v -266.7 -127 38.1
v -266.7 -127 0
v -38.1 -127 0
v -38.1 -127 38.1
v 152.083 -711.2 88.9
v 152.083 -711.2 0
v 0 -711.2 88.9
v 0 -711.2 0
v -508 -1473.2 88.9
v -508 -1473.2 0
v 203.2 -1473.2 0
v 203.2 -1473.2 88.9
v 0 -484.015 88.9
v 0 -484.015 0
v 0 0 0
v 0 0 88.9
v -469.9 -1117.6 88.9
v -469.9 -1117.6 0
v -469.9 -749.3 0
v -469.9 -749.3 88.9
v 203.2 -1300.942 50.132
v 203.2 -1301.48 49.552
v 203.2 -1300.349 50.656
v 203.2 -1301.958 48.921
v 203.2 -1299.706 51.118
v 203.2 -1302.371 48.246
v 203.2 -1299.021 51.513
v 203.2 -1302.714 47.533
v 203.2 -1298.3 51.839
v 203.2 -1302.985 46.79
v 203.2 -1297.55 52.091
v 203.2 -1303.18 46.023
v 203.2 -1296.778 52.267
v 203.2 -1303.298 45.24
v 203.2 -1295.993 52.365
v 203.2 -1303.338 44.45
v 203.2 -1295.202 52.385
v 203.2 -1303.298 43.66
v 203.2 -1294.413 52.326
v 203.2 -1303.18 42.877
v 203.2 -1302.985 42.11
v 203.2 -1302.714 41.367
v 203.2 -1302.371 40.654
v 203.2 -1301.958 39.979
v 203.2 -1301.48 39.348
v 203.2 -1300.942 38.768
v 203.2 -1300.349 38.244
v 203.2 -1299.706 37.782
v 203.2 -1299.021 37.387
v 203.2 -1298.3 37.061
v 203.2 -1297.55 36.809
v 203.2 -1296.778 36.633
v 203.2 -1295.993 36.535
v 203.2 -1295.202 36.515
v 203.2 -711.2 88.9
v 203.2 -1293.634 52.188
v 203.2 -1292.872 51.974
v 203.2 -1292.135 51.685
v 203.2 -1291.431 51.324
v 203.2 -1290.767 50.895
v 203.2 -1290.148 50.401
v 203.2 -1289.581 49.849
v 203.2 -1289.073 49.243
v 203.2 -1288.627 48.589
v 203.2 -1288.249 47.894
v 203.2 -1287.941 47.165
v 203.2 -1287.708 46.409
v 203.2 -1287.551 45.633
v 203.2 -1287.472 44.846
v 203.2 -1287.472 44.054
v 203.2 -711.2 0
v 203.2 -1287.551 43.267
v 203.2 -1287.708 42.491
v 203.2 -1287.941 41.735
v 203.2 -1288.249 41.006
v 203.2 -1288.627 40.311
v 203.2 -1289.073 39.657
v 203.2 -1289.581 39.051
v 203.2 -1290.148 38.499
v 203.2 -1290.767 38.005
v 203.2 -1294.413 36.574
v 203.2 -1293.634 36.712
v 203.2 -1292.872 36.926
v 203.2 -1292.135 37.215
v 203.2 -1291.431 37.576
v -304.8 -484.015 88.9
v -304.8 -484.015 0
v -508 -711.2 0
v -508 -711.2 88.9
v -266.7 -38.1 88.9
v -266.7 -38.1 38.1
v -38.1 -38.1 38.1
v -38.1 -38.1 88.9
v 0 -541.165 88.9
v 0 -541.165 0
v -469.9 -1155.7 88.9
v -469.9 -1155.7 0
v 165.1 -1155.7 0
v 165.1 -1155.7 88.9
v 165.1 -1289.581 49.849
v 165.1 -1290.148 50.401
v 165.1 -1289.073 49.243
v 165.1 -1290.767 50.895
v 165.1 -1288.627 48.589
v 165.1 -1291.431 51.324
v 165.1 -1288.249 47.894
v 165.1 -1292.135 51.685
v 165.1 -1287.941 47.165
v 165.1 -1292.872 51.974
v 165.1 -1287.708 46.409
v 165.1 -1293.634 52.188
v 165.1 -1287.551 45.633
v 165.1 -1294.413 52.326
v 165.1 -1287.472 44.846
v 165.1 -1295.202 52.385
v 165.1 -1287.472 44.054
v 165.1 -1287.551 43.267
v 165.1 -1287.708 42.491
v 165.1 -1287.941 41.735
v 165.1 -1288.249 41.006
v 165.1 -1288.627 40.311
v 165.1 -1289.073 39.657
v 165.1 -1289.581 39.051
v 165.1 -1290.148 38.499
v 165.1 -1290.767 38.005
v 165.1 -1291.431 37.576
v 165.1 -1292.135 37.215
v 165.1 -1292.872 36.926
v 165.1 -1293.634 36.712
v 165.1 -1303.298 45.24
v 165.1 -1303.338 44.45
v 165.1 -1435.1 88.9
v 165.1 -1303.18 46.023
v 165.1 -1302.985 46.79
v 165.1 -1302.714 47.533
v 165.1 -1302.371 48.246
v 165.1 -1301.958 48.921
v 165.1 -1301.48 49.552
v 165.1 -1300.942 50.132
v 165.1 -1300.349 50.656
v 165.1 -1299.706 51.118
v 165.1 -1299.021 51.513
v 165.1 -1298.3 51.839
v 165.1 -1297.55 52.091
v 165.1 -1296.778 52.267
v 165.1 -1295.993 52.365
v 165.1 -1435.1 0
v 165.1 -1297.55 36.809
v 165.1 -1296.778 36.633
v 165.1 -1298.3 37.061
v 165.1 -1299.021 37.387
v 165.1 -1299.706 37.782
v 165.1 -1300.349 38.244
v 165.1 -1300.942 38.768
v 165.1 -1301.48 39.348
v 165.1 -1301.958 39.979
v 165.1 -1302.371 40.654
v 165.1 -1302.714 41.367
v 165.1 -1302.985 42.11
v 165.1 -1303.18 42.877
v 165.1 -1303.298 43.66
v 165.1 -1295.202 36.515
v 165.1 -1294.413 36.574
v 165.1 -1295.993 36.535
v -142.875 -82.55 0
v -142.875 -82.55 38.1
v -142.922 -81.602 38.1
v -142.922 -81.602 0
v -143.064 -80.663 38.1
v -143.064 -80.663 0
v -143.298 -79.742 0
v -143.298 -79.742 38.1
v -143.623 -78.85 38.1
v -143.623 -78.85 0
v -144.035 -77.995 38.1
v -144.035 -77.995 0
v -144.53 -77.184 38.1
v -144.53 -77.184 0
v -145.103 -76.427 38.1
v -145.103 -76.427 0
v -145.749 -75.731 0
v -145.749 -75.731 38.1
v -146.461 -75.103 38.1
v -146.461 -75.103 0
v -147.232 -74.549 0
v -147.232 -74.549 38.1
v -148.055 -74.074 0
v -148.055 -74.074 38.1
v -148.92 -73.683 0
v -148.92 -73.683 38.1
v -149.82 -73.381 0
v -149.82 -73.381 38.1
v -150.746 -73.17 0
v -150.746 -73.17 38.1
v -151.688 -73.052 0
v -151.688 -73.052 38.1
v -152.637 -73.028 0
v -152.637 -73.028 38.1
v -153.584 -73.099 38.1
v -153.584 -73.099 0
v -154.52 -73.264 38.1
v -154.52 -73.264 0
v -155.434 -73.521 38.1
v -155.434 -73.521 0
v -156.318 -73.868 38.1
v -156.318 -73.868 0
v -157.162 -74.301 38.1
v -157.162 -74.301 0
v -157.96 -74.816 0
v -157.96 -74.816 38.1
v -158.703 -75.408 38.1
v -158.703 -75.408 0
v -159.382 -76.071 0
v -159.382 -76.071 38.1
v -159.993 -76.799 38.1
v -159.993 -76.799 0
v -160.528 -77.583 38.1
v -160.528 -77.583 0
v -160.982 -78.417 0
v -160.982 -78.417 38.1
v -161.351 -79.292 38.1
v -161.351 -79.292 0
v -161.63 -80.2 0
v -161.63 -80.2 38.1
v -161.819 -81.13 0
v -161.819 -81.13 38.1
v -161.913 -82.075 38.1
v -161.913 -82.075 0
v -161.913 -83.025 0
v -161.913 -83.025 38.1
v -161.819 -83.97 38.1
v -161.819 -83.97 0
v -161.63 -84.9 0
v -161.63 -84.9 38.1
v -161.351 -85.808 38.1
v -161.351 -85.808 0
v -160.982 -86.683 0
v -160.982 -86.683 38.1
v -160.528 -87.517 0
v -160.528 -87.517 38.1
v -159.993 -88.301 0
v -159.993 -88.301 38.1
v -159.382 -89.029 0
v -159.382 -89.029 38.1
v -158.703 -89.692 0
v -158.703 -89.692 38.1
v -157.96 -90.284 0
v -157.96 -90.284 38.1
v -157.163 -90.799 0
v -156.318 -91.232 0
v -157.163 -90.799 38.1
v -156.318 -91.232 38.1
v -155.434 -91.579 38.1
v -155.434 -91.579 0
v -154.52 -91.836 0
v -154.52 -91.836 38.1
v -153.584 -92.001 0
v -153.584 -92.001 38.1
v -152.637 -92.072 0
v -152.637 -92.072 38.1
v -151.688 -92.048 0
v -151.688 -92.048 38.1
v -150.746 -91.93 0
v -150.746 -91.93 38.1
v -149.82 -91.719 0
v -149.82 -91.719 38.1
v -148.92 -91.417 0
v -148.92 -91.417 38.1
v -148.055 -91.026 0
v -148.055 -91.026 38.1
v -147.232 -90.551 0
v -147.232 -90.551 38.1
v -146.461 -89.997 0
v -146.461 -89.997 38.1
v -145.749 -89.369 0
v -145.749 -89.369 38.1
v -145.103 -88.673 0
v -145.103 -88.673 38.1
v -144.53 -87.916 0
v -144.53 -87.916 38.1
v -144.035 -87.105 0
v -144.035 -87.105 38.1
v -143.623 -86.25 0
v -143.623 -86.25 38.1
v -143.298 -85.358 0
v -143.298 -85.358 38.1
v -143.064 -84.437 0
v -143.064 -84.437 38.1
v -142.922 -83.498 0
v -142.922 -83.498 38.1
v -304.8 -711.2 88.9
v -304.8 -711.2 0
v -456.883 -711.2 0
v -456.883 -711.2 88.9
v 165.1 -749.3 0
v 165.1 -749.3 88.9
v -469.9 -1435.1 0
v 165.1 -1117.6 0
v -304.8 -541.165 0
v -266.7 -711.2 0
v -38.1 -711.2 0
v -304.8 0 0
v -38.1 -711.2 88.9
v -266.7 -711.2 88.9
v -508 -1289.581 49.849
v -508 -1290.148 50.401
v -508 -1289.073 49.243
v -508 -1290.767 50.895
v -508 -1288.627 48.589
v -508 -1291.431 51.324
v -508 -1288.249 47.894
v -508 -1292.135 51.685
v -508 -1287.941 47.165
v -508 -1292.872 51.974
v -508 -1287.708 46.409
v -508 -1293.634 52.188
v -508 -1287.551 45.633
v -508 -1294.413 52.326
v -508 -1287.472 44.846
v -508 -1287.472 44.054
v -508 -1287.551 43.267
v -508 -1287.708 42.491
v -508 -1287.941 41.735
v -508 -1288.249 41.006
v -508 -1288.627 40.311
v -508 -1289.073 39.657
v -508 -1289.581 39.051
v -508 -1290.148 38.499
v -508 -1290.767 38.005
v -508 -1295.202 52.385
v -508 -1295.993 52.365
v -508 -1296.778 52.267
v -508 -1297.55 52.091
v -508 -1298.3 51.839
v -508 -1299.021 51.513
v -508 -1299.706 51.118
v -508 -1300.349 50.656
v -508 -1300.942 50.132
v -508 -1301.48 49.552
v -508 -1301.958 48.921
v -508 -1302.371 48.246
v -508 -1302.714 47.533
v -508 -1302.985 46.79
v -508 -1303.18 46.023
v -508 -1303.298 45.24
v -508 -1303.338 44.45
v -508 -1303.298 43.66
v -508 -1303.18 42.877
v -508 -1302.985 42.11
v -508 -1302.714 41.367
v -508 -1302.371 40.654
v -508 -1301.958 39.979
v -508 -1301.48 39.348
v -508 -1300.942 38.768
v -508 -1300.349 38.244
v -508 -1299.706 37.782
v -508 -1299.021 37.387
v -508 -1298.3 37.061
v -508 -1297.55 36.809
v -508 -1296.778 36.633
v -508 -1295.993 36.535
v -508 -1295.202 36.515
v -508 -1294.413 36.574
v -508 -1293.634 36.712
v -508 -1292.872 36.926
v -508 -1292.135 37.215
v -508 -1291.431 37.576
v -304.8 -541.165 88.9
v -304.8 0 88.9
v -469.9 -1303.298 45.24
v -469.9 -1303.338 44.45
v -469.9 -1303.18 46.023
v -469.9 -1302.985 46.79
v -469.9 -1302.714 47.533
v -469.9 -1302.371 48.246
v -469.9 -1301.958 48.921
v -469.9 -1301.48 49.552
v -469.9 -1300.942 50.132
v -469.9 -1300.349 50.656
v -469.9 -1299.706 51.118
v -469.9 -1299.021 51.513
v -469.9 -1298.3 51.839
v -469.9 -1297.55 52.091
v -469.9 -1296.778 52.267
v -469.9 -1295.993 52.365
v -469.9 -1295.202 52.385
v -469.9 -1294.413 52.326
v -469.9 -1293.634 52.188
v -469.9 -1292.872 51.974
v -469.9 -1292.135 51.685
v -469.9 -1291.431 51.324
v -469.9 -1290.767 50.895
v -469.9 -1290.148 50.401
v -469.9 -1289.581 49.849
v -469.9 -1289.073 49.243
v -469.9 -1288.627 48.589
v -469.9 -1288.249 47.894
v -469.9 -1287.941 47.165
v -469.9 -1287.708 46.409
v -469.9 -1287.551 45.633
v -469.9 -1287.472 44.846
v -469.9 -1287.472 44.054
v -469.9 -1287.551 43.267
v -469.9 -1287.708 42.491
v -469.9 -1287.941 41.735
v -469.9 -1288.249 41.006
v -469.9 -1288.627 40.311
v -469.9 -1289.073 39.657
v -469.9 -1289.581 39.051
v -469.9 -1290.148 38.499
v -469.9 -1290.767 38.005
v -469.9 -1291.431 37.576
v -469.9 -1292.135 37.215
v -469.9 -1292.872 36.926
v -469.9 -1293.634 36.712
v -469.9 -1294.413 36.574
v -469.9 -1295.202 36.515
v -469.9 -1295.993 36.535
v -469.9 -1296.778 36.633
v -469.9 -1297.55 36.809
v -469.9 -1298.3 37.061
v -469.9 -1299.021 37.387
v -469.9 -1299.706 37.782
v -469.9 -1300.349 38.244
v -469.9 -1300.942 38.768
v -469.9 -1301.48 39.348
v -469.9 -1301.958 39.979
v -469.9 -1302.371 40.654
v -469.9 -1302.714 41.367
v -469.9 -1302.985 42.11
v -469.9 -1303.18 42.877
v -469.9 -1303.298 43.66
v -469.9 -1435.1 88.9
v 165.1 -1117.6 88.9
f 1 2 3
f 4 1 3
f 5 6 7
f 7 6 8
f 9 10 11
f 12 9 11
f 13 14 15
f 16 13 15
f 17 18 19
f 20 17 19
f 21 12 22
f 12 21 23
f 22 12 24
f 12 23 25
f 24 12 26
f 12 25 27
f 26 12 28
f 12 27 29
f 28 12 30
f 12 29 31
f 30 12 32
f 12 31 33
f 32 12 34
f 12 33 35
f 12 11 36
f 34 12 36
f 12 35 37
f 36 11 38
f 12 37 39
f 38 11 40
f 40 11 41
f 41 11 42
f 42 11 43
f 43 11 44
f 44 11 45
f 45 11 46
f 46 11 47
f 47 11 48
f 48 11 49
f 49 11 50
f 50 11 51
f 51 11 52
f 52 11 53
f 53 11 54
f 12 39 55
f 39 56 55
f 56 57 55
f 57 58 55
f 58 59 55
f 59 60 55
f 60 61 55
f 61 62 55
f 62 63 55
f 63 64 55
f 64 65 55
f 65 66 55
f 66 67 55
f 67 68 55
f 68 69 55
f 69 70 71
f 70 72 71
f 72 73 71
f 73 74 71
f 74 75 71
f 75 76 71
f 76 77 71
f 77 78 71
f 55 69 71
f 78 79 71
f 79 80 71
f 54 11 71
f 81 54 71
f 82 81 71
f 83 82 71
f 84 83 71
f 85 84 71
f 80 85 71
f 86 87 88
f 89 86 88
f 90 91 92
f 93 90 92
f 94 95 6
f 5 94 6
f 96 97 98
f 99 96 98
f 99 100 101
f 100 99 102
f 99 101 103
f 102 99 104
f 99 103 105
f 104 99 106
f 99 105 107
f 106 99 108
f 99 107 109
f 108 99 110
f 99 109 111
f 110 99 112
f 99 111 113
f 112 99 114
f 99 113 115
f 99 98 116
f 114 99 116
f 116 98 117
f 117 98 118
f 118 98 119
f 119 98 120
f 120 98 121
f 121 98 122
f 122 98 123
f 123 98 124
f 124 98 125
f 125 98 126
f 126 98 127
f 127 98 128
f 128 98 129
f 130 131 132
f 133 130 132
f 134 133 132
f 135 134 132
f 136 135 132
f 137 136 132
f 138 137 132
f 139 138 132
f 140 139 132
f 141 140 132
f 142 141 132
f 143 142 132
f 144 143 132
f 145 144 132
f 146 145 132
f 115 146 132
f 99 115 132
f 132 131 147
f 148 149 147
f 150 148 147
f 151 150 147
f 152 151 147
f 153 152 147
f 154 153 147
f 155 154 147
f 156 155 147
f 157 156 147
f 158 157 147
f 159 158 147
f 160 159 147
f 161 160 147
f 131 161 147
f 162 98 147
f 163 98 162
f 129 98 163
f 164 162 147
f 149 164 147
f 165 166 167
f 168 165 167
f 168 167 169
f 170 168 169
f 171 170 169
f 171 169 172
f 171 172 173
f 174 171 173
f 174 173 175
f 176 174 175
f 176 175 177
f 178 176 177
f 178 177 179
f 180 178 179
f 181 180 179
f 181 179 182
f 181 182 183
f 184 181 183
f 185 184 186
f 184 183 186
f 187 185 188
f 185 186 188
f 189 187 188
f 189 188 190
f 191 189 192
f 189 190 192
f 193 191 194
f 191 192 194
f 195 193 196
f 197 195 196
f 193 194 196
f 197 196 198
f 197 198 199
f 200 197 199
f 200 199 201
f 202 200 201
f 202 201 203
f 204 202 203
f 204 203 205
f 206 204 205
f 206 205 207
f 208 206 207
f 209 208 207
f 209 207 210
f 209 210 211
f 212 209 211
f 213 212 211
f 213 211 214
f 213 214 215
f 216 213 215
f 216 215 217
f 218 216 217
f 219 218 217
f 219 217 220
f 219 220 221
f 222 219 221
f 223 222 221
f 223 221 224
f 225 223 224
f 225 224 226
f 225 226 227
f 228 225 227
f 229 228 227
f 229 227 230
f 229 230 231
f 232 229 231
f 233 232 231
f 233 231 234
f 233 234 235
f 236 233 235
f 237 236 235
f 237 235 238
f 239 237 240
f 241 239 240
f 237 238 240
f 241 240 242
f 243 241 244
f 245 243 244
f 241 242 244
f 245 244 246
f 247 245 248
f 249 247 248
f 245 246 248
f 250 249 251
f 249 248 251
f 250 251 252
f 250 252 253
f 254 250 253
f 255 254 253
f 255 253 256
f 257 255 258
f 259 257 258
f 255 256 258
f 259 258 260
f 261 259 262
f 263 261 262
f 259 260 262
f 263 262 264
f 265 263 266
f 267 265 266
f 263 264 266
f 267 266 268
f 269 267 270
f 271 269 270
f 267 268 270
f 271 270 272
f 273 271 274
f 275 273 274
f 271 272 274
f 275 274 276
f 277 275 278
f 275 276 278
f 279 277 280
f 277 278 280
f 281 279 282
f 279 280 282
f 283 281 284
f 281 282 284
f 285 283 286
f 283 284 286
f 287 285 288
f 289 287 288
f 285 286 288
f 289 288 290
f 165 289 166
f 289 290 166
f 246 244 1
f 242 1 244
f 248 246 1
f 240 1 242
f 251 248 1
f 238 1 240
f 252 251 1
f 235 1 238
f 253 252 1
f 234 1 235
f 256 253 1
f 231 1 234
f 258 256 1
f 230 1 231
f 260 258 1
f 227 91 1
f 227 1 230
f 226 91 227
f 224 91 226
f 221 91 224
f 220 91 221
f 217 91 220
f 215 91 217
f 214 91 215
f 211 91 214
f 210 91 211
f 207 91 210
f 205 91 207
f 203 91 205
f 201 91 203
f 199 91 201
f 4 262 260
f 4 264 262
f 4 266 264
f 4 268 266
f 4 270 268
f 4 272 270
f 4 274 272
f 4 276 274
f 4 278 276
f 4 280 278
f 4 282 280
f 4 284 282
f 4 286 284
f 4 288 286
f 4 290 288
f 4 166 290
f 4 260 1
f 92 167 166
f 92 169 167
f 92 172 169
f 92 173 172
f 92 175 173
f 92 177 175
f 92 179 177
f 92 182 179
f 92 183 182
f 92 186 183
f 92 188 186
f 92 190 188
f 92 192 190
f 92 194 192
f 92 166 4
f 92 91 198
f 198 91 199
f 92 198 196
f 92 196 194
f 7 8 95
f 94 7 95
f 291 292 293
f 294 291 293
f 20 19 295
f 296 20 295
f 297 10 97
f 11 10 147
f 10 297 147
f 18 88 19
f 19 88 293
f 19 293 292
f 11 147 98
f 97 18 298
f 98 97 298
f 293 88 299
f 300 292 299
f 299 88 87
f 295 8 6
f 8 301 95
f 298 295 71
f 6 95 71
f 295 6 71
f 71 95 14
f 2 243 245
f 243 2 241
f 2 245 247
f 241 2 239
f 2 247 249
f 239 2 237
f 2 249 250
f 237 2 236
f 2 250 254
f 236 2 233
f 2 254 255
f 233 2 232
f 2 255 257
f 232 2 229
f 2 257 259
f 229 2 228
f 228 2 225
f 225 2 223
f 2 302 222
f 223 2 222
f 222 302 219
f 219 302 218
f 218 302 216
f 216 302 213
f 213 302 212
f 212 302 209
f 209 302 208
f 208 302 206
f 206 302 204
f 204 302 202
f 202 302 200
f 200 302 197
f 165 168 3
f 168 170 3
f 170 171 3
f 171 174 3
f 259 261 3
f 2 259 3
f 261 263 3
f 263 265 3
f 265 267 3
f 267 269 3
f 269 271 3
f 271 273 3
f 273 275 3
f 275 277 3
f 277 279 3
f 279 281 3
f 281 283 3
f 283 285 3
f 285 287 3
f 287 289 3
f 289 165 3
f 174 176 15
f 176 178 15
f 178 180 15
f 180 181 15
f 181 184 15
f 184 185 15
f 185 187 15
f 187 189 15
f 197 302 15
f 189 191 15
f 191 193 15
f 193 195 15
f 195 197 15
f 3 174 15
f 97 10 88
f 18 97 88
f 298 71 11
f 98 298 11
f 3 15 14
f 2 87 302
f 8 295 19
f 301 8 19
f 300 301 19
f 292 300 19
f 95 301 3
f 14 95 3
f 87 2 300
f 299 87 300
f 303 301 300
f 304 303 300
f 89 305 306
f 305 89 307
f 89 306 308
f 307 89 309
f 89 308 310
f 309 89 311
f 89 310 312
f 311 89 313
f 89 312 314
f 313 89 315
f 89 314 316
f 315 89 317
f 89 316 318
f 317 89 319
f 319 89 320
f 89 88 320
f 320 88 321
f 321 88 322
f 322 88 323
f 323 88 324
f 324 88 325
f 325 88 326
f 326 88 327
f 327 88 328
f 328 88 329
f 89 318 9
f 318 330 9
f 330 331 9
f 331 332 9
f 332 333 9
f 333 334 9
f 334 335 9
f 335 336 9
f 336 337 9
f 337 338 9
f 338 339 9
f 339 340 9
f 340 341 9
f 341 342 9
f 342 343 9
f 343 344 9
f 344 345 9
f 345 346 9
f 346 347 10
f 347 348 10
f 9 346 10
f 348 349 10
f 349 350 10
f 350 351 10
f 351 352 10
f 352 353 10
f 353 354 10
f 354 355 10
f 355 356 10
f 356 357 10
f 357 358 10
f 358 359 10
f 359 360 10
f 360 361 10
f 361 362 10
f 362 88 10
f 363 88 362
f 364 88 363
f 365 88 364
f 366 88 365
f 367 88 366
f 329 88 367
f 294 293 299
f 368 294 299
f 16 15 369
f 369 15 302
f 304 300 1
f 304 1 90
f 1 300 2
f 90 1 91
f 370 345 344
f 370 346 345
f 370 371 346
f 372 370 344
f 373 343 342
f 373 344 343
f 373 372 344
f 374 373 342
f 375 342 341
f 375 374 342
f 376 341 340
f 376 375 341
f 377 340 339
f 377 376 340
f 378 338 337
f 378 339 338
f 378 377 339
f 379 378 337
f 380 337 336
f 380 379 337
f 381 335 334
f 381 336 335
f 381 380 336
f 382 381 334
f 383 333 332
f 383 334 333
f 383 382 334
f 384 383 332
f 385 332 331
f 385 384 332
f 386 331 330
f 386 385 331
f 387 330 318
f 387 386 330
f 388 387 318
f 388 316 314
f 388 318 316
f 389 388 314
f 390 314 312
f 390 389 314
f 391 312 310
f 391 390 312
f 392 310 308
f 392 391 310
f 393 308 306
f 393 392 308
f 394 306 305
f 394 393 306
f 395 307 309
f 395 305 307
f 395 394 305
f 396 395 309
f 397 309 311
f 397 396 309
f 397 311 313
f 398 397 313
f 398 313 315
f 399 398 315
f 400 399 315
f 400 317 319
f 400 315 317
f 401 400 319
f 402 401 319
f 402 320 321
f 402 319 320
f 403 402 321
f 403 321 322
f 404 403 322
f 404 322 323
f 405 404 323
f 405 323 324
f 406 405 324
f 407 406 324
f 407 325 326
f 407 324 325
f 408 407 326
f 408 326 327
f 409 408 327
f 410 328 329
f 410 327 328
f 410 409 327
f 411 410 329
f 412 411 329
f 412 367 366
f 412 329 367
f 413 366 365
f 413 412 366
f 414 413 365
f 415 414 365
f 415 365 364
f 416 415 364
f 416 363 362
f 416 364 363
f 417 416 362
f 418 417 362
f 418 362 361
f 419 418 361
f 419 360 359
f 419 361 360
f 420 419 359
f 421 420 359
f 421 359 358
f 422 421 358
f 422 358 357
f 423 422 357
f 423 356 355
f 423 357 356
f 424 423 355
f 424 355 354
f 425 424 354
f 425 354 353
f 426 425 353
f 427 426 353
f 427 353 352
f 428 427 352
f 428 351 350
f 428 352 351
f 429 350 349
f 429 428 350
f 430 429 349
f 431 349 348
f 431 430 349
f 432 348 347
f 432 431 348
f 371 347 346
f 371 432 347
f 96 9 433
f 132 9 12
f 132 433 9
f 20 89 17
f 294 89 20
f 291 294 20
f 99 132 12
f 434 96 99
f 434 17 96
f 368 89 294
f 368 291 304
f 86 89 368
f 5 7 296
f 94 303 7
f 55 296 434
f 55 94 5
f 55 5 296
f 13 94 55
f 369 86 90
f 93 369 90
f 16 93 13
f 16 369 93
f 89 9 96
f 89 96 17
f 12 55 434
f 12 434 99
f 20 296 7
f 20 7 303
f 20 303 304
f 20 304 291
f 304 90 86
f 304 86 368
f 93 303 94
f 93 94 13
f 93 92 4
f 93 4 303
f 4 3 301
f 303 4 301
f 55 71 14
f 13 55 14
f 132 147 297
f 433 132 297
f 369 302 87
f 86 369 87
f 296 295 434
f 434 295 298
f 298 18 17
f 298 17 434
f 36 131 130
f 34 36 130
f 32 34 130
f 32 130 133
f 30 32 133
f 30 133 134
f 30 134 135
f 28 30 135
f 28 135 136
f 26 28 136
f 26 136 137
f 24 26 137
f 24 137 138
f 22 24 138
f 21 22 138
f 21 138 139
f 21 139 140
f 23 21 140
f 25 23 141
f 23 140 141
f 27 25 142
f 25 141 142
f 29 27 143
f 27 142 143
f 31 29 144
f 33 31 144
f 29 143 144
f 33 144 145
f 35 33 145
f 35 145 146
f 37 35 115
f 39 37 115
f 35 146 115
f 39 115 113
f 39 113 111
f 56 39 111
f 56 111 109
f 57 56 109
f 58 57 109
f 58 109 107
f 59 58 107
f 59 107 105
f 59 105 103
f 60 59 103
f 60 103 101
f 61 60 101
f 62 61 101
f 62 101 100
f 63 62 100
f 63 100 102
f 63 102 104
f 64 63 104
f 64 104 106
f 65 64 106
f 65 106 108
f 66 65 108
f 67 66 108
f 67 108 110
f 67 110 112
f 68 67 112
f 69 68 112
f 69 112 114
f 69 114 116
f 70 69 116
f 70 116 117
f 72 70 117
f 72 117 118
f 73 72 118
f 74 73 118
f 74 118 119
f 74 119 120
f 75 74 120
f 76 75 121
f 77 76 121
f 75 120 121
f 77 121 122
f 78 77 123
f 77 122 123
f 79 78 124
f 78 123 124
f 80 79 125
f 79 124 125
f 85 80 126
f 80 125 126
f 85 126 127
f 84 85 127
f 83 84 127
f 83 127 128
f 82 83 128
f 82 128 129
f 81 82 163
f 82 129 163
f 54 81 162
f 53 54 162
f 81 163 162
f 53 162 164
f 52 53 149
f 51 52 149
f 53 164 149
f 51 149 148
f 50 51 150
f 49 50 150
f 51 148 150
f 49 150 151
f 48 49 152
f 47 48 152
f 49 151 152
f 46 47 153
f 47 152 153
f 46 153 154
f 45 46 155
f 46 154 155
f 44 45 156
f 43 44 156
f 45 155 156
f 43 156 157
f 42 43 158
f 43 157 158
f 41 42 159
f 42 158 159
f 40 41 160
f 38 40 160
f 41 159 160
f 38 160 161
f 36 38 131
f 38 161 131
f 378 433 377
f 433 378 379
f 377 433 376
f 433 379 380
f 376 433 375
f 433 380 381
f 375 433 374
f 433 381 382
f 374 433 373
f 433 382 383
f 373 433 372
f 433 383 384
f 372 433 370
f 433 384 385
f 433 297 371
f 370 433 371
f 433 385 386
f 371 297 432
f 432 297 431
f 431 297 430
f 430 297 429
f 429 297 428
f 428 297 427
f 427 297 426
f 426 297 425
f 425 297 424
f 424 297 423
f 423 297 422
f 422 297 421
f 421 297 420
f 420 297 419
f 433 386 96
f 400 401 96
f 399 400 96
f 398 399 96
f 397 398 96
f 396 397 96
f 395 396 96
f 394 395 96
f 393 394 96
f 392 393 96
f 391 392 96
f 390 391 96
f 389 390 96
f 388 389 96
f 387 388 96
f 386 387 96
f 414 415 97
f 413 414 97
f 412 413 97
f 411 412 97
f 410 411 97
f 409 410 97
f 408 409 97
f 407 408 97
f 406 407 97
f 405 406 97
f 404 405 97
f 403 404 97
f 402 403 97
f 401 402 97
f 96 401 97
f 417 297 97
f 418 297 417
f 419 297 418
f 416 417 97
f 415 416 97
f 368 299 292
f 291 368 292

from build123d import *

# Parameters (mm, degrees)
F0_W          = 635
F0_H          = 38.1
F0_W_2        = 38.1
F1_DEPTH      = 88.9
F0_W_3        = 228.6
F0_H_2        = 88.9
F2_DEPTH      = 38.1
F3_R          = 9.525
F4_DEPTH      = 38.101
F5_R          = 7.9375
F6_DEPTH      = 673.101
F6_DEPTH_BACK = 38.101


with BuildPart() as f1:
    # F0 (on Top) → F1 (new body)
    with BuildSketch(Plane.XY):
        Polygon((0, -484.015493486), (0, 0), (-304.8, 0), (-304.8, -484.015493486), (-304.8, -541.165493486), (-304.8, -711.2), (-266.7, -711.2), (-266.7, -127), (-266.7, -38.1), (-38.1, -38.1), (-38.1, -127), (-38.1, -711.2), (0, -711.2), (0, -541.165493486), align=None)
        Polygon((-304.8, -541.165493486), (-304.8, -484.015493486), (-508, -711.2), (-456.8834860344, -711.2), align=None)
        Polygon((203.2, -711.2), (0, -484.015493486), (0, -541.165493486), (152.0834860344, -711.2), align=None)
        Polygon((203.2, -1117.6), (203.2, -711.2), (152.0834860344, -711.2), (0, -711.2), (-38.1, -711.2), (-152.4, -711.2), (-266.7, -711.2), (-304.8, -711.2), (-456.8834860344, -711.2), (-508, -711.2), (-508, -1117.6), (-469.9, -1117.6), (-469.9, -749.3), (165.1, -749.3), (165.1, -1117.6), align=None)
        with Locations((-152.4, -1136.65)):
            Rectangle(F0_W, F0_H)
        with Locations((184.15, -1136.65)):
            Rectangle(F0_W_2, F0_H)
        Polygon((203.2, -1473.2), (203.2, -1155.7), (165.1, -1155.7), (165.1, -1435.1), (-469.9, -1435.1), (-469.9, -1155.7), (-508, -1155.7), (-508, -1473.2), align=None)
        with Locations((-488.95, -1136.65)):
            Rectangle(F0_W_2, F0_H)
    extrude(amount=F1_DEPTH)

    # F0 (on Top) → F2 (join)
    with BuildSketch(Plane.XY):
        with Locations((-152.4, -82.55)):
            Rectangle(F0_W_3, F0_H_2)
    extrude(amount=F2_DEPTH)

    # F3 (on face) → F4 (cut, through all)
    with BuildSketch(Plane.XY.offset(38.1)):
        with Locations((-152.4, -82.55)):
            Circle(F3_R)
    extrude(amount=-F4_DEPTH, mode=Mode.SUBTRACT)

    # F5 (on face) → F6 (cut, two sides)
    with BuildSketch(Plane(origin=(165.1, 0, 0), x_dir=(0, -1, 0), z_dir=(-1, 0, 0))) as f6_sk:
        with Locations((1295.4, 44.45)):
            Circle(F5_R)
    extrude(amount=F6_DEPTH, mode=Mode.SUBTRACT)
    extrude(f6_sk.sketch, amount=-F6_DEPTH_BACK, mode=Mode.SUBTRACT)


solid = f1.part
